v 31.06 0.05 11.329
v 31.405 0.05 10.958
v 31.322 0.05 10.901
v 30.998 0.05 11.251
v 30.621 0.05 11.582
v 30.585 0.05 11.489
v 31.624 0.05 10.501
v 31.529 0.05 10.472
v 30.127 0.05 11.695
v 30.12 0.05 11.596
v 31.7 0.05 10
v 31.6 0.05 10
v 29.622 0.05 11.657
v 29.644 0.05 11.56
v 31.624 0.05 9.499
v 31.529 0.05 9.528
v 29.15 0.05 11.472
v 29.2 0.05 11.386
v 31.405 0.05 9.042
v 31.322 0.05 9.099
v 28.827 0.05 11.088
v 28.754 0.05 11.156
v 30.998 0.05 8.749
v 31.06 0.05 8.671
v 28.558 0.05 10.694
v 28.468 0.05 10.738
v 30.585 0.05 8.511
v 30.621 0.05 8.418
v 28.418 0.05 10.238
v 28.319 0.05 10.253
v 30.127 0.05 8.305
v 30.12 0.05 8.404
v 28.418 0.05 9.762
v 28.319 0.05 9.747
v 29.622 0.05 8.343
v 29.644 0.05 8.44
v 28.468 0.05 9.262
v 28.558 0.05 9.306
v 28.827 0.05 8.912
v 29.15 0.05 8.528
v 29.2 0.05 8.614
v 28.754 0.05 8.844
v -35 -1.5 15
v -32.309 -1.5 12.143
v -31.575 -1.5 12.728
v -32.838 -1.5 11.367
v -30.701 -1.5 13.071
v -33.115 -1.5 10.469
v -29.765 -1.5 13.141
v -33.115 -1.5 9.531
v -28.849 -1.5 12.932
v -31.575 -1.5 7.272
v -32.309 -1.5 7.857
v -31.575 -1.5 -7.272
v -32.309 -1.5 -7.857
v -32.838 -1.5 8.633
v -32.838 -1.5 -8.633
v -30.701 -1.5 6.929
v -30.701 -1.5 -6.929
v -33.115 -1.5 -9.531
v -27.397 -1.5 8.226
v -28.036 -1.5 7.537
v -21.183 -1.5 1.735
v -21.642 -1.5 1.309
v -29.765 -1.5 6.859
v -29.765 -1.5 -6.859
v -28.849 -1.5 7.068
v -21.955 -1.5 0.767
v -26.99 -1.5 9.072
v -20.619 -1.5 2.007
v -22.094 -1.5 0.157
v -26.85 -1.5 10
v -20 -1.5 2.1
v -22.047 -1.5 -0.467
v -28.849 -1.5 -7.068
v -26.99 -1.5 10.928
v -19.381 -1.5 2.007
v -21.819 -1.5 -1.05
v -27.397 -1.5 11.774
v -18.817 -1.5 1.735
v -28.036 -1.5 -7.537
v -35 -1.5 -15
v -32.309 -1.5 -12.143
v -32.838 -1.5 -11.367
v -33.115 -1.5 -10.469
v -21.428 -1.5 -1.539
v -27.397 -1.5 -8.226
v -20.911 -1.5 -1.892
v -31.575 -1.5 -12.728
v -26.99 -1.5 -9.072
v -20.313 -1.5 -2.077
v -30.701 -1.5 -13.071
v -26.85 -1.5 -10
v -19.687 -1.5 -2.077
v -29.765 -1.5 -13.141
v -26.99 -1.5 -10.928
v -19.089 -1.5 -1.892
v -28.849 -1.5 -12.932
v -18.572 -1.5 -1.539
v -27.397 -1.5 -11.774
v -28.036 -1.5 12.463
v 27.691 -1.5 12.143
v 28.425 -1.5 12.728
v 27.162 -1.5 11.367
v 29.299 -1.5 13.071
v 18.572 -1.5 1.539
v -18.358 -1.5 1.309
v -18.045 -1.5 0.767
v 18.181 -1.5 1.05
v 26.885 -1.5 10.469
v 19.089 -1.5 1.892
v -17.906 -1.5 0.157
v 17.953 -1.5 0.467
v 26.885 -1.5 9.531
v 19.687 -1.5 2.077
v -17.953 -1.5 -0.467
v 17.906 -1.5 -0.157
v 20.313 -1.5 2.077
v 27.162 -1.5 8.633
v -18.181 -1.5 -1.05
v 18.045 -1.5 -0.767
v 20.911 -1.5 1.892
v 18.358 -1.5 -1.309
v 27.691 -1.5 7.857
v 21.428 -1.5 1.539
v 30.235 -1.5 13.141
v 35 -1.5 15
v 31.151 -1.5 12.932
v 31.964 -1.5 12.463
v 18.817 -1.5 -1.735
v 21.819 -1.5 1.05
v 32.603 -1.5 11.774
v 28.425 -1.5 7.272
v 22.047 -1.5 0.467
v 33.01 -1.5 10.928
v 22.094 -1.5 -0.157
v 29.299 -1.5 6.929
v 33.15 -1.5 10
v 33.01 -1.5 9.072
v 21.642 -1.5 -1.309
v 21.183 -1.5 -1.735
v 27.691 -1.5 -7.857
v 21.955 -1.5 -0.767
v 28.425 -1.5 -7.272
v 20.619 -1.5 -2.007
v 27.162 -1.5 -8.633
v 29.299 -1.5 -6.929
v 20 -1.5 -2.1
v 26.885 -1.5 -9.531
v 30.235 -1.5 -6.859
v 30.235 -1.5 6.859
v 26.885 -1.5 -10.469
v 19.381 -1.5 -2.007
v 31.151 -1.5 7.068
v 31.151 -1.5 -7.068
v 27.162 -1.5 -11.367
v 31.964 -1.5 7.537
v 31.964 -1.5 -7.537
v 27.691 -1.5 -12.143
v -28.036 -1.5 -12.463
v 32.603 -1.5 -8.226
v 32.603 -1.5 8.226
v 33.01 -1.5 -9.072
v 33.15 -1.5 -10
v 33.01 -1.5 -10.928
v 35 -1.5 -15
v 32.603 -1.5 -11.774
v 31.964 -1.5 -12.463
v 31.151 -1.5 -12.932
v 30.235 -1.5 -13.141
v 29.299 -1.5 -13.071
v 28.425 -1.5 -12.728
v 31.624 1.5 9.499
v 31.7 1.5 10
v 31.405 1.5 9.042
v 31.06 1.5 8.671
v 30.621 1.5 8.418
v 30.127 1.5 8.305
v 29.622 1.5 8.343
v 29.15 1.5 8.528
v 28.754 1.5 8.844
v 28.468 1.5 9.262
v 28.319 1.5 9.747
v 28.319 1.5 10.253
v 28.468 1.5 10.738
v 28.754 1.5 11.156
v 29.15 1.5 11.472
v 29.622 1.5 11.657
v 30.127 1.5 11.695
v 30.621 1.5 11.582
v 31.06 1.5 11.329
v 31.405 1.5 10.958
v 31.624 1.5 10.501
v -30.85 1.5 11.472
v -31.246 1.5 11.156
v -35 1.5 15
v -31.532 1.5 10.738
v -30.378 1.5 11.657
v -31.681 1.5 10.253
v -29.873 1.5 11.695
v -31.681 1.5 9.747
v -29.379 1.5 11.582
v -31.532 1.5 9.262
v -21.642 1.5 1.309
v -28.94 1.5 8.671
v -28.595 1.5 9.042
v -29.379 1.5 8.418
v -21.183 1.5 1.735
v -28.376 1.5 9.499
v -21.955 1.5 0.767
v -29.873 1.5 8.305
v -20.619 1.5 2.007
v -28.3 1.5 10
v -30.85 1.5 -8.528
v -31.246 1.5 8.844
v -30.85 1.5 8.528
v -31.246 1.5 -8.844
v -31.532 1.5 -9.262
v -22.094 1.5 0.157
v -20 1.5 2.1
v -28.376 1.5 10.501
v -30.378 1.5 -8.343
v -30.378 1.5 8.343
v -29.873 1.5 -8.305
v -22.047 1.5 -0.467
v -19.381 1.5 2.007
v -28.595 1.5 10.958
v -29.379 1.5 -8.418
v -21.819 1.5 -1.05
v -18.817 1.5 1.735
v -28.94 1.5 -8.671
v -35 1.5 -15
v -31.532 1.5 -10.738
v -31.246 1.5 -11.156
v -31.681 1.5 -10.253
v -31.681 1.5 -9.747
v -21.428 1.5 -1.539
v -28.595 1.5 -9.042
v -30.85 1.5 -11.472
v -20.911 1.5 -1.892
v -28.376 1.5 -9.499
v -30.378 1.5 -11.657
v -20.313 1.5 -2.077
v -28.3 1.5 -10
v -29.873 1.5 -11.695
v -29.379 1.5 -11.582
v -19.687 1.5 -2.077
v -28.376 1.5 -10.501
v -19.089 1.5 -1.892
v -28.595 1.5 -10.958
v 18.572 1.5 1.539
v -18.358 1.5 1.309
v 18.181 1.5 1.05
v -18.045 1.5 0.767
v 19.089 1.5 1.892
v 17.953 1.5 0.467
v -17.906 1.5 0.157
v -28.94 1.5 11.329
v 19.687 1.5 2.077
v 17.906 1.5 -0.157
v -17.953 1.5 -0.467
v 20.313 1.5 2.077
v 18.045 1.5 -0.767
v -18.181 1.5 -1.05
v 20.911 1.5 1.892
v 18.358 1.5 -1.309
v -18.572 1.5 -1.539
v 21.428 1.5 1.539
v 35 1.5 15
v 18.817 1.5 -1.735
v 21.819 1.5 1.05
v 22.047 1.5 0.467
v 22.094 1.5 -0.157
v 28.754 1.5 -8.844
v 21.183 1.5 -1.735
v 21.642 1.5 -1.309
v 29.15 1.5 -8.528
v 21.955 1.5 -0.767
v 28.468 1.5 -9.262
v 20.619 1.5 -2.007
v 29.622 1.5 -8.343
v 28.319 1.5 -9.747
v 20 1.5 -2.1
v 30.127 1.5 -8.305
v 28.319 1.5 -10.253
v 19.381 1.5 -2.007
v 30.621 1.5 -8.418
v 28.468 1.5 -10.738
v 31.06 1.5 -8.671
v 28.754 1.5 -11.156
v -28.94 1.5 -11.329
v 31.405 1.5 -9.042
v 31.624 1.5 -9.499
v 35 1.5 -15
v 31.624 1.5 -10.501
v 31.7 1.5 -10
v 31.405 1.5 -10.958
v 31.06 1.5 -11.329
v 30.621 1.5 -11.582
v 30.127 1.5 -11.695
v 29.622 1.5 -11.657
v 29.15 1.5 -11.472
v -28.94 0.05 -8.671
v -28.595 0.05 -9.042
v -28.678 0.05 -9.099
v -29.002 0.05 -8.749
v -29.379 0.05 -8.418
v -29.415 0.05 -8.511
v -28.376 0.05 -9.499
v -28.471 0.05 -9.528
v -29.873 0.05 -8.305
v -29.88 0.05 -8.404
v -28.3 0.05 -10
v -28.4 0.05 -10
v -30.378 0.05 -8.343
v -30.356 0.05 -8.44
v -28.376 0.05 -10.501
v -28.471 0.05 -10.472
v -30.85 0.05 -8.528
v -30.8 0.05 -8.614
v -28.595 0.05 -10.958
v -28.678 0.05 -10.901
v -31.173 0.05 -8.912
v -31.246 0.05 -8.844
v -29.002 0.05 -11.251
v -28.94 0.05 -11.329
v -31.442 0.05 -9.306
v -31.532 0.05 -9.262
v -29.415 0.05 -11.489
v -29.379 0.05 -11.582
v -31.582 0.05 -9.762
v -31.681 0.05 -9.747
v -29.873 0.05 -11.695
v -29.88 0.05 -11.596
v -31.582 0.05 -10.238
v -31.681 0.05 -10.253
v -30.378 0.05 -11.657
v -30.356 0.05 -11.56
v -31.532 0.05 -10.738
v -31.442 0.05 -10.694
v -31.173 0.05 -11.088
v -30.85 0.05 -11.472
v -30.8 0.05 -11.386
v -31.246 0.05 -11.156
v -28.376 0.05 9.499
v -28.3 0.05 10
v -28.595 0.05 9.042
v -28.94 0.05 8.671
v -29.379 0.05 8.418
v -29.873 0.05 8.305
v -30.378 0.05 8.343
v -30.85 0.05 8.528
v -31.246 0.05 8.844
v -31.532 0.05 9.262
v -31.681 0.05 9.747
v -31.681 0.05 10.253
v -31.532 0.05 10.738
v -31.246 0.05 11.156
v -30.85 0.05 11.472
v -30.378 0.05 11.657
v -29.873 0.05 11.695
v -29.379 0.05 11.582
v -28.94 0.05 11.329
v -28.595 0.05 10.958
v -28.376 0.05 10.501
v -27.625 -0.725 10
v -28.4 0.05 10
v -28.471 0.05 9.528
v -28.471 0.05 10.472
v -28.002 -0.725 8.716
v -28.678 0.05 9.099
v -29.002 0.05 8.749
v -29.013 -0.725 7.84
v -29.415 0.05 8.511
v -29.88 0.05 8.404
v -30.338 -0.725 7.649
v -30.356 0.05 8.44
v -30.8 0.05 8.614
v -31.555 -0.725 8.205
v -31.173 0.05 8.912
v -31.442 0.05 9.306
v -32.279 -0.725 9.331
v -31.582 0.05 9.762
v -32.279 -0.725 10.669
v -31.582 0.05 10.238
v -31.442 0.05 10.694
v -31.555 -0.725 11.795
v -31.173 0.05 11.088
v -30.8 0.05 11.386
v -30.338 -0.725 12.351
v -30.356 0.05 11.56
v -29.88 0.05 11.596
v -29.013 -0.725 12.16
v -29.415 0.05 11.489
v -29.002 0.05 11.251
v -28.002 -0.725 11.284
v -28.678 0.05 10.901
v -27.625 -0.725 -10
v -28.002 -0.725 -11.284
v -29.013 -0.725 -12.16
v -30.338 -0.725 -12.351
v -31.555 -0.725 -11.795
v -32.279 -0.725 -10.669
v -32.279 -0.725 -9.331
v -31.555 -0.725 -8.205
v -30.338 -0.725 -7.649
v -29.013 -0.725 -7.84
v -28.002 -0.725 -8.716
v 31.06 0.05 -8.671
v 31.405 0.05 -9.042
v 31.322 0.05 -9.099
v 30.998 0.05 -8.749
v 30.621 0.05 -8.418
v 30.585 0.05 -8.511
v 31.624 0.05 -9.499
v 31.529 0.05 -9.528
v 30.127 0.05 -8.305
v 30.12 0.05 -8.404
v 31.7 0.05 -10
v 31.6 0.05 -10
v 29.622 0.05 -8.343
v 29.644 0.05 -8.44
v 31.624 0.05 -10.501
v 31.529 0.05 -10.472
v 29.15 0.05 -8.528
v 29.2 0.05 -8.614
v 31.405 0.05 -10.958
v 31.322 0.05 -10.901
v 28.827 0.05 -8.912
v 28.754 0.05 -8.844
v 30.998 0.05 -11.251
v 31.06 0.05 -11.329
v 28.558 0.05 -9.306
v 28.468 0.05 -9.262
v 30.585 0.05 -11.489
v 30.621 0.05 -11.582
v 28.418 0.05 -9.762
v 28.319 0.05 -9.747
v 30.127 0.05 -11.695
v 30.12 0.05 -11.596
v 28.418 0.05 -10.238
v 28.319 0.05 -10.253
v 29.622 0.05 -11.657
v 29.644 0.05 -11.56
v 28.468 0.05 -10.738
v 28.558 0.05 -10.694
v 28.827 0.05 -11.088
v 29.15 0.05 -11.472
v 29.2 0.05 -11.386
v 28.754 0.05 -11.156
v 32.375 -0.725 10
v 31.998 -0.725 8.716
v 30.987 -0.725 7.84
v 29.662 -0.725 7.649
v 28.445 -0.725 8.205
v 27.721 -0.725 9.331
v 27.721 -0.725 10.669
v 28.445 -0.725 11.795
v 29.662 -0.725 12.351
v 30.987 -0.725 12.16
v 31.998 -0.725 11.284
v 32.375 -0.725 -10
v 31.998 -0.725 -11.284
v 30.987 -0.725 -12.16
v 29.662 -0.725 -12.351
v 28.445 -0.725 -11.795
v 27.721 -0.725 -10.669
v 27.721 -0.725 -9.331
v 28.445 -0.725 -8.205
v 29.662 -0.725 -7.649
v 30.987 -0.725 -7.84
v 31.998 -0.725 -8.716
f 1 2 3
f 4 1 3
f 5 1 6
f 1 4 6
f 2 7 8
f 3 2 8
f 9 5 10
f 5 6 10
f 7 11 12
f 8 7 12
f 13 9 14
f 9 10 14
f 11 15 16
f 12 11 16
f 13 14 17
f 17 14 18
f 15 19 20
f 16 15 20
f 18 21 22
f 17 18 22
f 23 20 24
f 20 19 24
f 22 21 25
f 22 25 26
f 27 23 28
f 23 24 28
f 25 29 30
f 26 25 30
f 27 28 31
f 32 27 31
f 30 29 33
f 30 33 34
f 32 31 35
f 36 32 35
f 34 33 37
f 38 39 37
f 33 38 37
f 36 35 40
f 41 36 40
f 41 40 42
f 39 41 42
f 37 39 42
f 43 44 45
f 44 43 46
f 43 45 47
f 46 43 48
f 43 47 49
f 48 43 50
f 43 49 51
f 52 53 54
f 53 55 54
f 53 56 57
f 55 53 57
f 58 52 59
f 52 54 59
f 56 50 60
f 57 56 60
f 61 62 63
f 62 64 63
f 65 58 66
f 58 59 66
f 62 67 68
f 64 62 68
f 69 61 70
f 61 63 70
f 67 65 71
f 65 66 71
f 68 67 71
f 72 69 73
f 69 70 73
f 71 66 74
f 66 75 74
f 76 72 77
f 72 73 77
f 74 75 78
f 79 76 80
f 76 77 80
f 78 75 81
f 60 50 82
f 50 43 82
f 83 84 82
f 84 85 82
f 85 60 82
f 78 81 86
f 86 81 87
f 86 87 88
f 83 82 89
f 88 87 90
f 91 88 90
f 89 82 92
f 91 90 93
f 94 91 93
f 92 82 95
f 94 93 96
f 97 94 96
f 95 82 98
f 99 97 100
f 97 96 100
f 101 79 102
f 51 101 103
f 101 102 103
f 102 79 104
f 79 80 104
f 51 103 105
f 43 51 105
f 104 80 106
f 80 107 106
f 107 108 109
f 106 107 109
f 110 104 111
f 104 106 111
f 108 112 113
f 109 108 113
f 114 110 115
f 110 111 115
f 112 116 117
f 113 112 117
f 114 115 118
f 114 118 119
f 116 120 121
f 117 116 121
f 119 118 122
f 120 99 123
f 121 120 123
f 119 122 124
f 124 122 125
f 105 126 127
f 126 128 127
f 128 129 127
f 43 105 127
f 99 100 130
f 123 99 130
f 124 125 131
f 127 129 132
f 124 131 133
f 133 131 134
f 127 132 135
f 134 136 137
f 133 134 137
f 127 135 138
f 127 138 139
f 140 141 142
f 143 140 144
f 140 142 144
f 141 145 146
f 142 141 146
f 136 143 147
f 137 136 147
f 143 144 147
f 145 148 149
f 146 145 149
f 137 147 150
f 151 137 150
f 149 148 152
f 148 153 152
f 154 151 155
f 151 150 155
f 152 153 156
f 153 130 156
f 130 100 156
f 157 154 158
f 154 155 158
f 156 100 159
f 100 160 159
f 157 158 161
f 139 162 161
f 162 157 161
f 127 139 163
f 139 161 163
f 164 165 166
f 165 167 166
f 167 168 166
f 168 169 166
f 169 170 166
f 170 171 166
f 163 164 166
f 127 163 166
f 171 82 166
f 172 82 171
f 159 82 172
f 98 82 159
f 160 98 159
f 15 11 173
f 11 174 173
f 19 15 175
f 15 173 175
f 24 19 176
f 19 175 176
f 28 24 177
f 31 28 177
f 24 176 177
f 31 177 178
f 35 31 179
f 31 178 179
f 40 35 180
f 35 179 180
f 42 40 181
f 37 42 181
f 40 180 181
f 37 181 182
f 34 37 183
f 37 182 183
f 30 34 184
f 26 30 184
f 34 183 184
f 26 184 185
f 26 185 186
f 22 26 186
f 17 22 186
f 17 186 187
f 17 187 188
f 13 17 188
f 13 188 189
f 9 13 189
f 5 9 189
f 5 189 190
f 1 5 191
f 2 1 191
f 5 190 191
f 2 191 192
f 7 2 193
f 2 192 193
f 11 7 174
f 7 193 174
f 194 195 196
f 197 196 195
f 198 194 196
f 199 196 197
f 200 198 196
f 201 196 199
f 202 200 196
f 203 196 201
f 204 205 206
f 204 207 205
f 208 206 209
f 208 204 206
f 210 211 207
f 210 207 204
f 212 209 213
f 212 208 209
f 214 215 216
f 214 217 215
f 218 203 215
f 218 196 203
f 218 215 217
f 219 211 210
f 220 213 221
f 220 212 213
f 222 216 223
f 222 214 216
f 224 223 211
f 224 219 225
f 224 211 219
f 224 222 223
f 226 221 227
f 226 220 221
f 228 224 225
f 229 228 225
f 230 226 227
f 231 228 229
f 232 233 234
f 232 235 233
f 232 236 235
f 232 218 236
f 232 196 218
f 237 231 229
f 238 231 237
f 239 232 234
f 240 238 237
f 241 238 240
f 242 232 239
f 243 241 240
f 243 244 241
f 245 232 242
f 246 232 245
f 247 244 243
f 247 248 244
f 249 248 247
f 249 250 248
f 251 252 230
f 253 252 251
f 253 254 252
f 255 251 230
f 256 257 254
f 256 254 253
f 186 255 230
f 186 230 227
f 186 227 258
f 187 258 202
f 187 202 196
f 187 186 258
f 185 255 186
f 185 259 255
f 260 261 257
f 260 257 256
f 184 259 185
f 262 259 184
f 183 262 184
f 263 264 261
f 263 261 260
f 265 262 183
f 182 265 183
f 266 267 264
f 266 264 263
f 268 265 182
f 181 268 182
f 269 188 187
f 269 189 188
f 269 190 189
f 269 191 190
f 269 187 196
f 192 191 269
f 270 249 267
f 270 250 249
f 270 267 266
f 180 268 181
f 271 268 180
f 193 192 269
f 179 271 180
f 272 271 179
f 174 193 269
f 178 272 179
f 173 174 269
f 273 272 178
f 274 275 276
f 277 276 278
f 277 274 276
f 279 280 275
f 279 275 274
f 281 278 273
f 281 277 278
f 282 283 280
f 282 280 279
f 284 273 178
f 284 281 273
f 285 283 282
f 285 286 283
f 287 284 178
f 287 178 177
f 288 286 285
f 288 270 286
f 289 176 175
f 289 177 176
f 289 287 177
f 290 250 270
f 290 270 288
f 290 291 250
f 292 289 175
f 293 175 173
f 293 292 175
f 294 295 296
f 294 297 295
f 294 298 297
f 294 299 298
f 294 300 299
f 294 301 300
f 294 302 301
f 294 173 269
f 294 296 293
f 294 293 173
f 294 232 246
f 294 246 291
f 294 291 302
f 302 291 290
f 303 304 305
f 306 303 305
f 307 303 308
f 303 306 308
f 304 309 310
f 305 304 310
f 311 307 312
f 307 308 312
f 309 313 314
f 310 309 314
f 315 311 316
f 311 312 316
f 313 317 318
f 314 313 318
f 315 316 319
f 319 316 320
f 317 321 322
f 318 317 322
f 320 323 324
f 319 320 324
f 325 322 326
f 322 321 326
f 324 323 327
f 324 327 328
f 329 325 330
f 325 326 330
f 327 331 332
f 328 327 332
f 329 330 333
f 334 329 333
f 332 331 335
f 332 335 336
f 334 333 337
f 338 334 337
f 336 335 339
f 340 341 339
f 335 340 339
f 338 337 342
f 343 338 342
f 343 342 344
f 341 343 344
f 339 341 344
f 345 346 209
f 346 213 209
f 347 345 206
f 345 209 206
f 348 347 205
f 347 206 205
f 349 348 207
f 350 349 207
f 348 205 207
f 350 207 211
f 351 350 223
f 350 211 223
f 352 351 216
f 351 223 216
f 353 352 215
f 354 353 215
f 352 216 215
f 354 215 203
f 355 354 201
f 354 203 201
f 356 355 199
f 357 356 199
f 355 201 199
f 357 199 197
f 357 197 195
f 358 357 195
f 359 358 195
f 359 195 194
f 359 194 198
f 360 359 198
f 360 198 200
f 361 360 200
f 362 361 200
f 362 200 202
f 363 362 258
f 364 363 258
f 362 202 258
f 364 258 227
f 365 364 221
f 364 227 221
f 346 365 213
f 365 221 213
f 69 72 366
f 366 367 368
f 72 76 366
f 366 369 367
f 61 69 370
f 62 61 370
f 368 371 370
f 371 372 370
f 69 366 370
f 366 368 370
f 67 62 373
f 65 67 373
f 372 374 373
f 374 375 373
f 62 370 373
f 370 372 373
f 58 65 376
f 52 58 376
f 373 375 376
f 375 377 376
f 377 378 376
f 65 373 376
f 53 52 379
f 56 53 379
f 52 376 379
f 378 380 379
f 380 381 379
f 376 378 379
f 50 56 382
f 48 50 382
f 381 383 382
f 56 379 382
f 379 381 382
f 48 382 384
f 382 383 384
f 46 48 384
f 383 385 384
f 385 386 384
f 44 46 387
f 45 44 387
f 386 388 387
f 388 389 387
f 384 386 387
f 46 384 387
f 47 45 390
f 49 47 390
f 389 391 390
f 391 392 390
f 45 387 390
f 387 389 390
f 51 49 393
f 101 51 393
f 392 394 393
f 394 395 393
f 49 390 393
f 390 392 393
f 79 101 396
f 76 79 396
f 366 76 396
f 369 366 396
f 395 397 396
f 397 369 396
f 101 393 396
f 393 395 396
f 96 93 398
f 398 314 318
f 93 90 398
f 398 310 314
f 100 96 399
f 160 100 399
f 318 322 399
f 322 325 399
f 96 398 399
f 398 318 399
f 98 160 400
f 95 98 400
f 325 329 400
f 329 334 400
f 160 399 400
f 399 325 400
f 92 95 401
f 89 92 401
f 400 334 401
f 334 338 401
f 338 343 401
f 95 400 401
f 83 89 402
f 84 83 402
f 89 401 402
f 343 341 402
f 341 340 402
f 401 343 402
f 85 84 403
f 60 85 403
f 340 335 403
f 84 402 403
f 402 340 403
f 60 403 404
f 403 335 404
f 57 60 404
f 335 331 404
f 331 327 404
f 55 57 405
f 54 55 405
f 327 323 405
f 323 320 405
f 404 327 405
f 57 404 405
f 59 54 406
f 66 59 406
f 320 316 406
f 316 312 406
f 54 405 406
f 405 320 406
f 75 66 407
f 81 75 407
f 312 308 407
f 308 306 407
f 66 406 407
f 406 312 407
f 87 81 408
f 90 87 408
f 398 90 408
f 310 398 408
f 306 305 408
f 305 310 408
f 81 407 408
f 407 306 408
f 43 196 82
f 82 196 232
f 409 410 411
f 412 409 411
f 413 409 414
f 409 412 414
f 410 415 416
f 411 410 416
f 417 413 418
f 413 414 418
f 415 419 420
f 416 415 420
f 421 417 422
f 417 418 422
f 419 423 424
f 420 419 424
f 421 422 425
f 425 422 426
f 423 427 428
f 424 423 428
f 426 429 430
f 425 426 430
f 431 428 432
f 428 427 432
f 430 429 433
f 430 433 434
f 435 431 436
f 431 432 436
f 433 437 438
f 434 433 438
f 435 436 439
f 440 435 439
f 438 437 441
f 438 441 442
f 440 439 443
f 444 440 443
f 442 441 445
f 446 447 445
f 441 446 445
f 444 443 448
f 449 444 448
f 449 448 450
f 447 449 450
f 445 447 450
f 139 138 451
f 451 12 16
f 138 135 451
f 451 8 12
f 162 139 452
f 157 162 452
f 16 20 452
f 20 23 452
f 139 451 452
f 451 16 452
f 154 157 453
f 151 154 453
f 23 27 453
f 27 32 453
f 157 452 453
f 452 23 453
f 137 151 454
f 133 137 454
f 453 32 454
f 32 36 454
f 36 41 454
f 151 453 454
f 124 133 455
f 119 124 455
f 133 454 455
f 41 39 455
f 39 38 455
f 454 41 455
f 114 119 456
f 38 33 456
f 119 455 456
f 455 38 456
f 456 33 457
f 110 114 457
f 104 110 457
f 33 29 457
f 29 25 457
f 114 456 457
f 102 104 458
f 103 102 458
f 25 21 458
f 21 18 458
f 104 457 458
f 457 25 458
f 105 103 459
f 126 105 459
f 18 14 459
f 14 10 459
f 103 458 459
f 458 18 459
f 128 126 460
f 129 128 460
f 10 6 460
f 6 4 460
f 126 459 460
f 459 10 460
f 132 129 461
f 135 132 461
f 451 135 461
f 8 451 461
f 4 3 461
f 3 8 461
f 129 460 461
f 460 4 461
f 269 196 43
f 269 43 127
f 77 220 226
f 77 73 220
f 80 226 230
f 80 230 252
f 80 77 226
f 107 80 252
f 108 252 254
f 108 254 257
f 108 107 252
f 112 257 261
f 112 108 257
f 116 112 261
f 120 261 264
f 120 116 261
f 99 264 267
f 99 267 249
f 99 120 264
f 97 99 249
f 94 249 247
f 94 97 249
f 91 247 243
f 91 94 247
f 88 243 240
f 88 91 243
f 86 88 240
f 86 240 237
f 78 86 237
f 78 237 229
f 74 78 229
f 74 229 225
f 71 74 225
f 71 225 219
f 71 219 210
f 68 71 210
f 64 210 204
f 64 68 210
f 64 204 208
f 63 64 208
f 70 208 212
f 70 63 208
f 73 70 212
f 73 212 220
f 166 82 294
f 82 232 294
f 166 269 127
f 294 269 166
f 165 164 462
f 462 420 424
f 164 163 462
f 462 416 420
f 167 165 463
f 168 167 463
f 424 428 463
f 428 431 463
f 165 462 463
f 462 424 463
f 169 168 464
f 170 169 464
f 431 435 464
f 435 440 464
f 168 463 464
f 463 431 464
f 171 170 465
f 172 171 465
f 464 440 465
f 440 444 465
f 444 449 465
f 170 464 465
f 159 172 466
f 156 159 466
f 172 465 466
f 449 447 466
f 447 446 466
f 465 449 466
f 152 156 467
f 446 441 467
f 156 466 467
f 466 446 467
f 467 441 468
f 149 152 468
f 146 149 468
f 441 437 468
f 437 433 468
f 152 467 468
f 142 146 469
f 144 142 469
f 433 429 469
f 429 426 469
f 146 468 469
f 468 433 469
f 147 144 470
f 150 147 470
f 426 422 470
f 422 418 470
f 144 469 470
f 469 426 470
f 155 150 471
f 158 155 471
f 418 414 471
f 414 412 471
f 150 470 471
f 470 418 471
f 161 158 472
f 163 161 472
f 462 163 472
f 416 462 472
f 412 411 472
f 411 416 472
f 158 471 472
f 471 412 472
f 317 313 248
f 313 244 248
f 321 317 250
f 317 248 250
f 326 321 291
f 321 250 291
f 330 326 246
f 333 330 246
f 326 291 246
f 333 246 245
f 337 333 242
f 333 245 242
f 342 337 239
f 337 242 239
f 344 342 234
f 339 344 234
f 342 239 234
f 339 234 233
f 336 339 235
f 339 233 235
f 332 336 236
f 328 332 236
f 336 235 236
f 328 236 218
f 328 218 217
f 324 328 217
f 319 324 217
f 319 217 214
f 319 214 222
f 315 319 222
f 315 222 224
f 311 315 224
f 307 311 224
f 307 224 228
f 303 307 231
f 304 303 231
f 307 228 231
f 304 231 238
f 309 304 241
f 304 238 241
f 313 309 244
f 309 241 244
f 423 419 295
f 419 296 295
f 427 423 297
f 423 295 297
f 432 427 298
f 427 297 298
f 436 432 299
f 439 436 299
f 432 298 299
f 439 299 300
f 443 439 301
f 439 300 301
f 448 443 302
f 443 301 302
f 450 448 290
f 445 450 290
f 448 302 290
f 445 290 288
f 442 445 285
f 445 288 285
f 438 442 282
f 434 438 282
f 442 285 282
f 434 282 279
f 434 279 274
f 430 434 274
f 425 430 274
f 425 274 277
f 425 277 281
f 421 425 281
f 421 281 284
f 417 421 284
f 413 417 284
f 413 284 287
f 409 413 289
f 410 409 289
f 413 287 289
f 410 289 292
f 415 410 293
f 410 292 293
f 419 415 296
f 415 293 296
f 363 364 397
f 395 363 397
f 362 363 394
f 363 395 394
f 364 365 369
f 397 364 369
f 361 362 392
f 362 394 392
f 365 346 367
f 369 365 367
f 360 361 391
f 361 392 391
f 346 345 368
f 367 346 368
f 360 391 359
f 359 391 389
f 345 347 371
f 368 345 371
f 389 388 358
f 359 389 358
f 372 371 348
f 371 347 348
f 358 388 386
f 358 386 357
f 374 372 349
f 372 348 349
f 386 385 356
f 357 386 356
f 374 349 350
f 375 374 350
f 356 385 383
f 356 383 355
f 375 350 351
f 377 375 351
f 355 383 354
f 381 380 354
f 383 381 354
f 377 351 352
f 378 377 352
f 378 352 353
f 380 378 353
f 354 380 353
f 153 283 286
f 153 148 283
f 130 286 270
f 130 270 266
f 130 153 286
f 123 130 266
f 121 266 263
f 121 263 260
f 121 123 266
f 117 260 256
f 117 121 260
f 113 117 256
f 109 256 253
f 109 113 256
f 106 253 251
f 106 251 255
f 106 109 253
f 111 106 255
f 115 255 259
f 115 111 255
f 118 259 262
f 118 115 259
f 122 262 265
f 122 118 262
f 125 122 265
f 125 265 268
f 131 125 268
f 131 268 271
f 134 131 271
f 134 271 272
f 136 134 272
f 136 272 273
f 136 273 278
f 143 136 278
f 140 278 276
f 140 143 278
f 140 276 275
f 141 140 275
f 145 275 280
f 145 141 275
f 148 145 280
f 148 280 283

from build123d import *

# Parameters (mm, degrees)
ESQUISSE1_W        = 70
ESQUISSE1_H        = 30
ESQUISSE1_R        = 2.1
BOSS_EXTRU_1_DEPTH = 1.5


# Read off the part's stored shape, not the designer's step: PerçageAvancé1
with BuildPart() as part:
    # Esquisse1 → Boss.-Extru.1 (new, symmetric)
    with BuildSketch(Plane(origin=(0, 0, 0), x_dir=(1, 0, 0), z_dir=(0, 1, 0))):
        Rectangle(ESQUISSE1_W, ESQUISSE1_H)
        with Locations(Location((-20, 0, 0), (0, 0, 270))):
            Circle(ESQUISSE1_R, mode=Mode.SUBTRACT)
        with Locations(Location((20, 0, 0), (0, 0, 90))):
            Circle(ESQUISSE1_R, mode=Mode.SUBTRACT)
    extrude(amount=BOSS_EXTRU_1_DEPTH, both=True)

    # PerçageAvancé1 outline → PerçageAvancé1 (revolve, cut)
    with BuildSketch(Plane(origin=(-30, 0, 10), x_dir=(1, 0, 0), z_dir=(0, 0, 1))):
        Polygon((1.6, 0.05), (1.7, 0.05), (1.7, 1.5), (0, 1.5), (0, -1.5), (3.15, -1.5), align=None)
    revolve(axis=Axis((-30, 0, 10), (0, 1, 0)), mode=Mode.SUBTRACT)

    # Per_ageAvanc_1 2 outline → Per_ageAvanc_1 2 (revolve, cut)
    with BuildSketch(Plane(origin=(30, 0, 10), x_dir=(1, 0, 0), z_dir=(0, 0, 1))):
        Polygon((1.6, 0.05), (1.7, 0.05), (1.7, 1.5), (0, 1.5), (0, -1.5), (3.15, -1.5), align=None)
    revolve(axis=Axis((30, 0, 10), (0, 1, 0)), mode=Mode.SUBTRACT)

    # Per_ageAvanc_1 3 outline → Per_ageAvanc_1 3 (revolve, cut)
    with BuildSketch(Plane(origin=(30, 0, -10), x_dir=(1, 0, 0), z_dir=(0, 0, 1))):
        Polygon((1.6, 0.05), (1.7, 0.05), (1.7, 1.5), (0, 1.5), (0, -1.5), (3.15, -1.5), align=None)
    revolve(axis=Axis((30, 0, -10), (0, 1, 0)), mode=Mode.SUBTRACT)

    # Per_ageAvanc_1 4 outline → Per_ageAvanc_1 4 (revolve, cut)
    with BuildSketch(Plane(origin=(-30, 0, -10), x_dir=(1, 0, 0), z_dir=(0, 0, 1))):
        Polygon((1.6, 0.05), (1.7, 0.05), (1.7, 1.5), (0, 1.5), (0, -1.5), (3.15, -1.5), align=None)
    revolve(axis=Axis((-30, 0, -10), (0, 1, 0)), mode=Mode.SUBTRACT)


solid = part.part
